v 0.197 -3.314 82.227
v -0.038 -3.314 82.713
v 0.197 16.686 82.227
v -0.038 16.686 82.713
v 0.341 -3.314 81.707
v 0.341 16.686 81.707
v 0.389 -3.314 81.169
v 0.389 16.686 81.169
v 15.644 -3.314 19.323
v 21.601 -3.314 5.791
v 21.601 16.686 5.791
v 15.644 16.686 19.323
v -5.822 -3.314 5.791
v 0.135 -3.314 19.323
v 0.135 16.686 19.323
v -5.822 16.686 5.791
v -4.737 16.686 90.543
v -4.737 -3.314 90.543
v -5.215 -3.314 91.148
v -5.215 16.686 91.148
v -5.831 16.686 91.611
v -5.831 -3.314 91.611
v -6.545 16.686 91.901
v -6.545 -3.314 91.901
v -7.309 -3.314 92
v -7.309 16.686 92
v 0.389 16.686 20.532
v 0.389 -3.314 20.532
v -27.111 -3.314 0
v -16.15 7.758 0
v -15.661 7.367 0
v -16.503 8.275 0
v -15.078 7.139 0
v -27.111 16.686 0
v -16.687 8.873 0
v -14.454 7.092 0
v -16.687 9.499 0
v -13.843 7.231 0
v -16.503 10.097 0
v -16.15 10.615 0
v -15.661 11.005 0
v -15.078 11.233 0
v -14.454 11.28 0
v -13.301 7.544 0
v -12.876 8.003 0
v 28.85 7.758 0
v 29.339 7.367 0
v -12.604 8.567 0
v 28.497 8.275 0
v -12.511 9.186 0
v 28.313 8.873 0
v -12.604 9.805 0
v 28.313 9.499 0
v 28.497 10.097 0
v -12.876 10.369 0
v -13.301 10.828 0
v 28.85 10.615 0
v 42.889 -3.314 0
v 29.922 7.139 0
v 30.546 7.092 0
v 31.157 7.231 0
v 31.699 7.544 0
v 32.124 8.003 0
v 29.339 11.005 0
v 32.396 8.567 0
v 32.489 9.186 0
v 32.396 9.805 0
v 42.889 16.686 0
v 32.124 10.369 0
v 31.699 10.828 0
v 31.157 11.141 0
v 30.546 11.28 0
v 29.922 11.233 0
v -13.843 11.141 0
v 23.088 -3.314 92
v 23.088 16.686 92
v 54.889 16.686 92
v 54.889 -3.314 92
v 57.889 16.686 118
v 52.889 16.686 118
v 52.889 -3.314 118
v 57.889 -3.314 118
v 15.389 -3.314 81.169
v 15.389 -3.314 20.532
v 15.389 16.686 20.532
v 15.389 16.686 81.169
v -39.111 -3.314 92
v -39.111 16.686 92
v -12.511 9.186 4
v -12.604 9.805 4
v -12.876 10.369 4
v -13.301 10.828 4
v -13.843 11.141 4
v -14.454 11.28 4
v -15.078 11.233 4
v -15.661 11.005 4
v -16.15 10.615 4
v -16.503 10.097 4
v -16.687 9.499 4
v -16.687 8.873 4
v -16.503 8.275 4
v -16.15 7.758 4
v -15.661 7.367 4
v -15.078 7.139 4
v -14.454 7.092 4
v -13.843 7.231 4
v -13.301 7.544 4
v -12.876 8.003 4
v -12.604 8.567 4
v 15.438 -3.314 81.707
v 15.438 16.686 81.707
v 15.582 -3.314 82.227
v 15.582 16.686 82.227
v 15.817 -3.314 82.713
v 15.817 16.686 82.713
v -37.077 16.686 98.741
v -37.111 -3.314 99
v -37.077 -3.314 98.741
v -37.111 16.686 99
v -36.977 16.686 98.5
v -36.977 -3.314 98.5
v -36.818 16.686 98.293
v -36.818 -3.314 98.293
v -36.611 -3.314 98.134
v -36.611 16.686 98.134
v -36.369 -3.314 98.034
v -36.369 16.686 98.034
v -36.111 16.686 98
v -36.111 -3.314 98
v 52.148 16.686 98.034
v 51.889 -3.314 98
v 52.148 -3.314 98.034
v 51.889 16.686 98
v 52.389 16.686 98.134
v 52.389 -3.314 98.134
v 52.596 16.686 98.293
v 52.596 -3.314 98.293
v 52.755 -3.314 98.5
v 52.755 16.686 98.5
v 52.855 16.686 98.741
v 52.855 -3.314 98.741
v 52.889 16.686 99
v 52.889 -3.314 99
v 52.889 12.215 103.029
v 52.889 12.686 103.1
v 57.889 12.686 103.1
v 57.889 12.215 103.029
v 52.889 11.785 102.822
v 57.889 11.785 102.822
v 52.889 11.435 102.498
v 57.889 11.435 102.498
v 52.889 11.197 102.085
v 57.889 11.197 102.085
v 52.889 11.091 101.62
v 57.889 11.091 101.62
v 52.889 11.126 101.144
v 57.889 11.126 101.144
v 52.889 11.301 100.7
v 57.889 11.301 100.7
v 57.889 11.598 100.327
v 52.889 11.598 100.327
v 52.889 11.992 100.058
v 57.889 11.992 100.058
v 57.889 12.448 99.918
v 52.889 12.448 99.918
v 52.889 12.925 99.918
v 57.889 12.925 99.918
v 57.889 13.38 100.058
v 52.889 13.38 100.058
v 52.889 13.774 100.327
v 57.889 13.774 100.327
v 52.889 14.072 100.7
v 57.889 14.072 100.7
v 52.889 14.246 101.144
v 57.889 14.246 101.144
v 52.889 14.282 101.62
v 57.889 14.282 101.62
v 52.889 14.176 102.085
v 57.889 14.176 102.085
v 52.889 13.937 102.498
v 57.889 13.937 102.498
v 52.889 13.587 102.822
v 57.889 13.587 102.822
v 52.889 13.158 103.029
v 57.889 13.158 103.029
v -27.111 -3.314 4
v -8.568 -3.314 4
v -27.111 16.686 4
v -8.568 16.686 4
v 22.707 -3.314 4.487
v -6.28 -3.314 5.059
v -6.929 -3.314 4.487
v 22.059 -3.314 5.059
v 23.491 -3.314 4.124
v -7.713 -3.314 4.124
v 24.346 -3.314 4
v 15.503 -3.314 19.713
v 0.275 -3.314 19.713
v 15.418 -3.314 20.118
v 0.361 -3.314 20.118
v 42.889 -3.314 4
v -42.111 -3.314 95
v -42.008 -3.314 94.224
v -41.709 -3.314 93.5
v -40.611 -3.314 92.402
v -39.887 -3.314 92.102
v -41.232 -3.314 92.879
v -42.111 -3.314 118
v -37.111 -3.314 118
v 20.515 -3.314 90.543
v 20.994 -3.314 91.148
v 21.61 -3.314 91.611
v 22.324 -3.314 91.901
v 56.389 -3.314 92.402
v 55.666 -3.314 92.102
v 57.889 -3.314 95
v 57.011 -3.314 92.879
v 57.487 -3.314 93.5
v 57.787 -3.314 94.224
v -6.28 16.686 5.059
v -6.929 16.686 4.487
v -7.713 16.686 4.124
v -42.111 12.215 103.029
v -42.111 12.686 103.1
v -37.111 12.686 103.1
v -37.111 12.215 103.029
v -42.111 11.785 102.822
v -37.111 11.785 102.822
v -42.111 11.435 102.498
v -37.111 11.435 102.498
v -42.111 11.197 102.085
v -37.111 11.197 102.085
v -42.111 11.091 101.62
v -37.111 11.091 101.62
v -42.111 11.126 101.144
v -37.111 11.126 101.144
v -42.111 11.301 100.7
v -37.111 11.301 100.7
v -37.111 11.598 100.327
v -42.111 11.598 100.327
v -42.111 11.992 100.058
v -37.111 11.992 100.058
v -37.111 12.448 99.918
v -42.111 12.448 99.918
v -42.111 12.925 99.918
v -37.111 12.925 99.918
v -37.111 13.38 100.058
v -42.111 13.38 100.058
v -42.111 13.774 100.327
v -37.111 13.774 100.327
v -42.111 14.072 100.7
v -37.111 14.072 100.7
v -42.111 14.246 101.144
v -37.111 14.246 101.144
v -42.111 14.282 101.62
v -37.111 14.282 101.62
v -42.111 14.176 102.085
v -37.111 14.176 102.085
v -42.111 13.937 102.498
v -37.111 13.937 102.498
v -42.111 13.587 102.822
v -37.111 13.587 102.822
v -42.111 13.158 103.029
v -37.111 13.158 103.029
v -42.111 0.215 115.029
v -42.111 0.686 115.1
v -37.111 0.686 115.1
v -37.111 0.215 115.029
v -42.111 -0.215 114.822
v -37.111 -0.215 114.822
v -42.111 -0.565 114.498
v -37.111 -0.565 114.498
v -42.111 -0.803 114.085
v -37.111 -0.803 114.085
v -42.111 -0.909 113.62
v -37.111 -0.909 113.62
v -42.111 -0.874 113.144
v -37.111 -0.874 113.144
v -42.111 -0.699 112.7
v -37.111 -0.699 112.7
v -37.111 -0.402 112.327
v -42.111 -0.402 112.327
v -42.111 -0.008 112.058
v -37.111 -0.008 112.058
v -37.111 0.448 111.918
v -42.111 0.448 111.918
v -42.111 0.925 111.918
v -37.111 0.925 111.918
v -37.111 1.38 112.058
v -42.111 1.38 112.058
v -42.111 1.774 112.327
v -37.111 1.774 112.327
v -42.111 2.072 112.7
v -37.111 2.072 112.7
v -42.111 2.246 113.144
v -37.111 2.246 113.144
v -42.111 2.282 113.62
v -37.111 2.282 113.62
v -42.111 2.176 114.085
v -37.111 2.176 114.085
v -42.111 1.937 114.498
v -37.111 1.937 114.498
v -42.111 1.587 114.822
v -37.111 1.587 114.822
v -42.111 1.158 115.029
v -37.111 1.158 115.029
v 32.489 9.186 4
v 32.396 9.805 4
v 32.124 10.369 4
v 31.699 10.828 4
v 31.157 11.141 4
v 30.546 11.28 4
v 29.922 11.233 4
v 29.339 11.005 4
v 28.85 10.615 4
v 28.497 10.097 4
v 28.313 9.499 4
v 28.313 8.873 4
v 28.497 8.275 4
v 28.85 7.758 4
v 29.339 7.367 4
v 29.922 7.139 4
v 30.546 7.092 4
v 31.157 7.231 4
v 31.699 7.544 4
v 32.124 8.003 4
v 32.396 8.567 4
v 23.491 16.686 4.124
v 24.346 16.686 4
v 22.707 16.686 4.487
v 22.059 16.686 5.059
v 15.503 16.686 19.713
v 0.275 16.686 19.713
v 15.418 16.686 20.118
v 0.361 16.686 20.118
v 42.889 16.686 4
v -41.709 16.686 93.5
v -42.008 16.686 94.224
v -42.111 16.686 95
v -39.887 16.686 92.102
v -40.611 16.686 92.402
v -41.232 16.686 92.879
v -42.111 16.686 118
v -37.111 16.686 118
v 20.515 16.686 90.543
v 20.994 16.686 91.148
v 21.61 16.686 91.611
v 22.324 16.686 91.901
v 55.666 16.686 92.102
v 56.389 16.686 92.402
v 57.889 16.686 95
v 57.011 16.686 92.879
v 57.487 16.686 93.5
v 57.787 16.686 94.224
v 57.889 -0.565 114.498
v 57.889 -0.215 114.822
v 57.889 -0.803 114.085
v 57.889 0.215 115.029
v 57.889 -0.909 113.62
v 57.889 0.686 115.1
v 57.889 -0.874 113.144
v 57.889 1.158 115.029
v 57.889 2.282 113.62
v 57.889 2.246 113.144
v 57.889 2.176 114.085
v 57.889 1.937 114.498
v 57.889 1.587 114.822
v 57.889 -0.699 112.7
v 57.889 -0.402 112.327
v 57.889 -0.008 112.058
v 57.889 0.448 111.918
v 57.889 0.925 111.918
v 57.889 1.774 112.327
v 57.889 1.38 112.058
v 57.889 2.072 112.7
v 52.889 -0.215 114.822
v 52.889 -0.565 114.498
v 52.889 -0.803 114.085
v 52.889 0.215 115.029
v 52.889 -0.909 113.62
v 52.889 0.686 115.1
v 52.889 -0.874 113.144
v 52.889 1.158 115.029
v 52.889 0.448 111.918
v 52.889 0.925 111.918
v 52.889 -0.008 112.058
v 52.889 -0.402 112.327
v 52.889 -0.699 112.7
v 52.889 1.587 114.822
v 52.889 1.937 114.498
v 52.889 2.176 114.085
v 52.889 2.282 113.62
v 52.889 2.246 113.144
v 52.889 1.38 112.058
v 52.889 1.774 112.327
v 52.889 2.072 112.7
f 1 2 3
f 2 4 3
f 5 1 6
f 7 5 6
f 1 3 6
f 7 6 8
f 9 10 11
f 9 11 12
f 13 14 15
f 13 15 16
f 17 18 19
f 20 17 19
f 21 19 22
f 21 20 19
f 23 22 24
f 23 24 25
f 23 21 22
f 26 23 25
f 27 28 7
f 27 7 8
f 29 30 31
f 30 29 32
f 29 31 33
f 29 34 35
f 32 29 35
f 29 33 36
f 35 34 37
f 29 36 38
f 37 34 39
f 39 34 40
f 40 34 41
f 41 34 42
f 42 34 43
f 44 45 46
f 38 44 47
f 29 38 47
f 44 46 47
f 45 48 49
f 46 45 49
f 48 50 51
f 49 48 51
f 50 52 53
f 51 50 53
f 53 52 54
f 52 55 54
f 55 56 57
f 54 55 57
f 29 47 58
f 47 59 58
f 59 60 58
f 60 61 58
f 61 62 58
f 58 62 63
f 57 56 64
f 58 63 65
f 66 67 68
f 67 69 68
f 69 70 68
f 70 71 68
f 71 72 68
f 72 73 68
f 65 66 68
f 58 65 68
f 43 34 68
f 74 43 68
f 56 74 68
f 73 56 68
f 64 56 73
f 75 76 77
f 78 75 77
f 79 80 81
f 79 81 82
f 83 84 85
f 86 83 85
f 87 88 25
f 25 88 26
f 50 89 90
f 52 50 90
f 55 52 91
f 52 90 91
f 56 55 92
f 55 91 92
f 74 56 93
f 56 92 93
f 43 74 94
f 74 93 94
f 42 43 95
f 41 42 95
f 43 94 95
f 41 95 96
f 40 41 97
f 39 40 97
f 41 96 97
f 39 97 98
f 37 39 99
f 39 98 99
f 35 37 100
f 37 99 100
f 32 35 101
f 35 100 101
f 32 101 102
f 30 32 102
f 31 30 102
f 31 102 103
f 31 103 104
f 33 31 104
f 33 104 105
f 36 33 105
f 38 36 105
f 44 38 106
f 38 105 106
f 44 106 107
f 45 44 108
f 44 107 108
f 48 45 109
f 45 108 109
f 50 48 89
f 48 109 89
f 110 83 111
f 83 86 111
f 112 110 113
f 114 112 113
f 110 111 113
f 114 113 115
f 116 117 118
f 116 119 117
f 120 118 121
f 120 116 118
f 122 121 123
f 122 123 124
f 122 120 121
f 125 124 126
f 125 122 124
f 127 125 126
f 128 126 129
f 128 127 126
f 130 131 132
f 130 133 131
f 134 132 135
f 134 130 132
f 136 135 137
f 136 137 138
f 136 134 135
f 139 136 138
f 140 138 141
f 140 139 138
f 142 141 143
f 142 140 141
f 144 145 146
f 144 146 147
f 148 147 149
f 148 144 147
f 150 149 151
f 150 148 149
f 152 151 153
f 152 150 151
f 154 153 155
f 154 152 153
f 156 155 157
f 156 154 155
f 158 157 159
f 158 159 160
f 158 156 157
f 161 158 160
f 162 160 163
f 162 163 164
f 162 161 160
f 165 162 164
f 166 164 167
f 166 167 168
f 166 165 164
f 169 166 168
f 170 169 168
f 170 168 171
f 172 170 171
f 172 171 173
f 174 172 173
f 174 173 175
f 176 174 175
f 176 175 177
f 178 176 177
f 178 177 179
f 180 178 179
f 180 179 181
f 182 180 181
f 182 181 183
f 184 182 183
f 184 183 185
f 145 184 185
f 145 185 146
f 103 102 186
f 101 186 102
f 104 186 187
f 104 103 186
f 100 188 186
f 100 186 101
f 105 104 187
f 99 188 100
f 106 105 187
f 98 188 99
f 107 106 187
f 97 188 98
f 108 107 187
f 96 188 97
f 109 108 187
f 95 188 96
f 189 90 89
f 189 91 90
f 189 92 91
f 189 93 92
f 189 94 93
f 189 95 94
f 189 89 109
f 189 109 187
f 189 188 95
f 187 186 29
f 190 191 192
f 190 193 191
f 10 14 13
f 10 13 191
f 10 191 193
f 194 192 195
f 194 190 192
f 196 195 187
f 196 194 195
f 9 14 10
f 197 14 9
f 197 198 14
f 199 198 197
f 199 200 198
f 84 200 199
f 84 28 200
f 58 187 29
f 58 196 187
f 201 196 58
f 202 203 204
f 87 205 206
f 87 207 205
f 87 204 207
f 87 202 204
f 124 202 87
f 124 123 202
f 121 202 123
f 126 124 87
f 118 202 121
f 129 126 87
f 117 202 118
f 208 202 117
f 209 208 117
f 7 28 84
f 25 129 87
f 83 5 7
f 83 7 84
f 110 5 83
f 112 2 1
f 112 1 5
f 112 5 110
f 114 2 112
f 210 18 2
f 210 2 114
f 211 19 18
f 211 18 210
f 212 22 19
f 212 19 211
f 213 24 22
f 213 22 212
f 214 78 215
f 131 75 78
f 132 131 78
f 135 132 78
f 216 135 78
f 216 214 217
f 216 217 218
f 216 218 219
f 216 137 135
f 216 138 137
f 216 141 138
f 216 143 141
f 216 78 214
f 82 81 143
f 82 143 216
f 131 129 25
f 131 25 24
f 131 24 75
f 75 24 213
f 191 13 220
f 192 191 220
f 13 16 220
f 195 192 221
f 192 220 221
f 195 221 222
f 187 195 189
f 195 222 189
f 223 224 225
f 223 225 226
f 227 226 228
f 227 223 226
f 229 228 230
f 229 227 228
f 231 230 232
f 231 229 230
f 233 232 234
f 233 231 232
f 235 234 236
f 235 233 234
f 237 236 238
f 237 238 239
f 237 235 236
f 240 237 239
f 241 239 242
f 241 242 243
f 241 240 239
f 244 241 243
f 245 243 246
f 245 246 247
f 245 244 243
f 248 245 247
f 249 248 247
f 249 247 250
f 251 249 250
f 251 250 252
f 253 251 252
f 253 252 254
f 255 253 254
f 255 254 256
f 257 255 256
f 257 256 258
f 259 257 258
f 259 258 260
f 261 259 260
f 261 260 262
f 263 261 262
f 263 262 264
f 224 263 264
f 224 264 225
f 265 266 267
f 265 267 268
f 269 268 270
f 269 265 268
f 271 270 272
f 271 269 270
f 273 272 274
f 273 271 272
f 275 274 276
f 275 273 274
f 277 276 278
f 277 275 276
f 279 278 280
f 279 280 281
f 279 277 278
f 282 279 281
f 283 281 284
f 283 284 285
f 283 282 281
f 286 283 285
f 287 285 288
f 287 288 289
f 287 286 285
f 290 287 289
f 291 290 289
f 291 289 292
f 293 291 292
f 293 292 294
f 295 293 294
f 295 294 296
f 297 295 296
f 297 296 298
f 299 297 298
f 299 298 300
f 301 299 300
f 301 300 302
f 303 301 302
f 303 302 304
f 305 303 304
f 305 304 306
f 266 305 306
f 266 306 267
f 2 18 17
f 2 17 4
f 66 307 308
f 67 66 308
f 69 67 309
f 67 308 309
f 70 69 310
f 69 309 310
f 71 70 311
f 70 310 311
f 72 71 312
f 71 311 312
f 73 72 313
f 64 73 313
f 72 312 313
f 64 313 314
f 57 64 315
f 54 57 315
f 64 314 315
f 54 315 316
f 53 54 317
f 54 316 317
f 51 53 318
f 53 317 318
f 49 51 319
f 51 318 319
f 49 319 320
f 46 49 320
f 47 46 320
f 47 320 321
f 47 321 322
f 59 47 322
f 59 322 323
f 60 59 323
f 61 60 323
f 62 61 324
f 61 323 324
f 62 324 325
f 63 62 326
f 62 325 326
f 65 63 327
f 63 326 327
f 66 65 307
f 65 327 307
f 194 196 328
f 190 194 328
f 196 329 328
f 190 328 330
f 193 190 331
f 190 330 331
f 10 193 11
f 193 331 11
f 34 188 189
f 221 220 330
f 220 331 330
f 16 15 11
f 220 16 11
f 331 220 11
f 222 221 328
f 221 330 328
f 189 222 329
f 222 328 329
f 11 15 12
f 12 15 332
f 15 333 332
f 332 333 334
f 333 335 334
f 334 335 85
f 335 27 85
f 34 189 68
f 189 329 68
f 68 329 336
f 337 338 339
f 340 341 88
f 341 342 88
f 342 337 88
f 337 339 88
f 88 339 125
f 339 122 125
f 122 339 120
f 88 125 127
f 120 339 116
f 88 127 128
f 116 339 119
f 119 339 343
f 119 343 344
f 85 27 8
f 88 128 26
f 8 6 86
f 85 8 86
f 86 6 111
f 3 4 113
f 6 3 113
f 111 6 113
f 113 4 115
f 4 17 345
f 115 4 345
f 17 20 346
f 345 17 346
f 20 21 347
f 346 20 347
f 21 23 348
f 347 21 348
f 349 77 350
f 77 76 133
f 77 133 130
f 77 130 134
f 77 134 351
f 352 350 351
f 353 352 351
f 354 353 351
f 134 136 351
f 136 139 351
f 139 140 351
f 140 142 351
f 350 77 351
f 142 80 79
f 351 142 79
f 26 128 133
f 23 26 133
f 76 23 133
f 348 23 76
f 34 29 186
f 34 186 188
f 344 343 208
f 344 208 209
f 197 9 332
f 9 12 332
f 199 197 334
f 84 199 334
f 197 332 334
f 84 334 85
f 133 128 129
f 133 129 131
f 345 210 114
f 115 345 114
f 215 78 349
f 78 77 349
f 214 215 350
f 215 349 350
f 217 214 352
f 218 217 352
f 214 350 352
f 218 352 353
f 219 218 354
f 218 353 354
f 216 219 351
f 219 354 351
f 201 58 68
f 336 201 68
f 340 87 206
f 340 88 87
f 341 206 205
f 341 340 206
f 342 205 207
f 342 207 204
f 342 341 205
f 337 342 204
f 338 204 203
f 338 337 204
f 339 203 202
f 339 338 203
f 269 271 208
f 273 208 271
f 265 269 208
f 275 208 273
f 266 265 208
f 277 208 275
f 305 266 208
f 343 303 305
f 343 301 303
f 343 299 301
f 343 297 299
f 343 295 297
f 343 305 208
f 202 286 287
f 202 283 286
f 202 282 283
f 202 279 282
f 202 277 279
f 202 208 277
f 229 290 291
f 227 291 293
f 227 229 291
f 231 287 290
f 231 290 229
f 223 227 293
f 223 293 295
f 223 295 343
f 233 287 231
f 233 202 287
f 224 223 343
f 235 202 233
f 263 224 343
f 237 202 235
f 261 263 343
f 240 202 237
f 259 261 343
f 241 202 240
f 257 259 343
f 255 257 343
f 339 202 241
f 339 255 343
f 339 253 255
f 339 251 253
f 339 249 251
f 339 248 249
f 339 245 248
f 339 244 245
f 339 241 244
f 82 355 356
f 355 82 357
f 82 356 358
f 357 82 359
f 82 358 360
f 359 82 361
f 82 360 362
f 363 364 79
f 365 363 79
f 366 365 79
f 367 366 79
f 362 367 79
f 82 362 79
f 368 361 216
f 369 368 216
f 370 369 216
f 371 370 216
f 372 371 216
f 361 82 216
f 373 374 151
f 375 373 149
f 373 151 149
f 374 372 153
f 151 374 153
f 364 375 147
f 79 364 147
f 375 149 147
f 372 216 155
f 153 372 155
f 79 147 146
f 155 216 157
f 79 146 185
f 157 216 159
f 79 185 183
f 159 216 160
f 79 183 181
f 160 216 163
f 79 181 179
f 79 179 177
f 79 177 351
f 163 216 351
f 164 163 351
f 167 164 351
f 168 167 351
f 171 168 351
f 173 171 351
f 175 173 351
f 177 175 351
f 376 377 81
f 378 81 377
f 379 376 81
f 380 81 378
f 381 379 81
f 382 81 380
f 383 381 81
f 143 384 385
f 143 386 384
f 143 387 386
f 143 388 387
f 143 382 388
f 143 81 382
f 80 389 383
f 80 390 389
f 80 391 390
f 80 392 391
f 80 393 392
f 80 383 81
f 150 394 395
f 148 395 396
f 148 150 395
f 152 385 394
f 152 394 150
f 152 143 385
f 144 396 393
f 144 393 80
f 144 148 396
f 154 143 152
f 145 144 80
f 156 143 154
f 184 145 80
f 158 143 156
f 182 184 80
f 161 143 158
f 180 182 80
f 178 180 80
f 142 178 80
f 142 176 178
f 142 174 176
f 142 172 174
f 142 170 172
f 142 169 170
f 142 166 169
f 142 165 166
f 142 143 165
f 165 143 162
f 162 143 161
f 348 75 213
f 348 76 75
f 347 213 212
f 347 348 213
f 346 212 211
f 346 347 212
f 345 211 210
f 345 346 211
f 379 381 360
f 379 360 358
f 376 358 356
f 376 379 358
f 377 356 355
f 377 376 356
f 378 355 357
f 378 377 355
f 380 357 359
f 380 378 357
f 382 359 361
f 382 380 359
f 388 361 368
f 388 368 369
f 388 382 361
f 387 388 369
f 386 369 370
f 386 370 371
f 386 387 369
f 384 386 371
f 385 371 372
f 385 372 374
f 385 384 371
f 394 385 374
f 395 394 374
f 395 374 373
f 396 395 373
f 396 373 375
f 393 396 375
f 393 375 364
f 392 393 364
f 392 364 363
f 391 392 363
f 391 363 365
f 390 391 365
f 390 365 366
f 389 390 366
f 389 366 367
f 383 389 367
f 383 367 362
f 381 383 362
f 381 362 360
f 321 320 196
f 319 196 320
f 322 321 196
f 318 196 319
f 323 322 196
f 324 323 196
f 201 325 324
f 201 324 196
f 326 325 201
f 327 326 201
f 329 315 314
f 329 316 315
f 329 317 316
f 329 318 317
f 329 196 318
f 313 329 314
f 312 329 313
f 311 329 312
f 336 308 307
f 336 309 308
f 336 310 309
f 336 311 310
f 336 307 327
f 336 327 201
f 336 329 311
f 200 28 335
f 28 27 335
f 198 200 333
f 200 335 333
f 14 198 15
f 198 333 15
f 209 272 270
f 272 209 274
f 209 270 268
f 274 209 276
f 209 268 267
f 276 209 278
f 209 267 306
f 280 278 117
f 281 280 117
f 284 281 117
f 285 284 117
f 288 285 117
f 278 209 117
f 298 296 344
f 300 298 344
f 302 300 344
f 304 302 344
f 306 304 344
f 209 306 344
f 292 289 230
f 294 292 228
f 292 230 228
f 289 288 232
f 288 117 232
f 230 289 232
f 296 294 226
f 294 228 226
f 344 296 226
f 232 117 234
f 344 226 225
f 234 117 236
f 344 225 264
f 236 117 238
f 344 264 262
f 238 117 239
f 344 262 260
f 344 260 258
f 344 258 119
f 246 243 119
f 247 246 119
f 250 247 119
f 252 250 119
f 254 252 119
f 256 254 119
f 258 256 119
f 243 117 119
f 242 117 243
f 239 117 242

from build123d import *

# Parameters (mm, degrees)
SKETCH_1_W          = 70
SKETCH_1_H          = 20
EXTRUDE_1_DEPTH     = 4
SKETCH_2_R          = 2.1
CUT_EXTRUDE_1_DEPTH = 4
SKETCH_3_W          = 15
SKETCH_3_H          = 20
EXTRUDE_2_DEPTH     = 88
SKETCH_4_W          = 100
SKETCH_4_H          = 20
EXTRUDE_3_DEPTH     = 6
SKETCH_5_W          = 5
SKETCH_5_H          = 20
EXTRUDE_4_DEPTH     = 20
SKETCH_6_R          = 1.6
CUT_EXTRUDE_2_DEPTH = 95
CUT_EXTRUDE_START   = -20
SKETCH_6_2_R        = 1.6
CUT_EXTRUDE_3_DEPTH = 20
EXTRUDE_5_DEPTH     = 20
EXTRUDE_6_DEPTH     = 20
FILLET_1_R          = 3
FILLET_2_R          = 1


with BuildPart() as part:
    # 草图1 → 凸台-拉伸1 (new body)
    with BuildSketch(Plane.XY):
        with Locations((7.889344262, 6.686147681)):
            Rectangle(SKETCH_1_W, SKETCH_1_H)
    extrude(amount=EXTRUDE_1_DEPTH)

    # 草图2 → 切除-拉伸1 (cut)
    with BuildSketch(Plane.XY.offset(4)):
        with Locations((-14.610655738, 9.186147681)):
            Circle(SKETCH_2_R)
        with Locations((30.389344262, 9.186147681)):
            Circle(SKETCH_2_R)
    extrude(amount=-CUT_EXTRUDE_1_DEPTH, mode=Mode.SUBTRACT)

    # 草图3 → 凸台-拉伸2 (add)
    with BuildSketch(Plane.XY.offset(4)):
        with Locations((7.889344262, 6.686147681)):
            Rectangle(SKETCH_3_W, SKETCH_3_H)
    extrude(amount=EXTRUDE_2_DEPTH)

    # 草图4 → 凸台-拉伸3 (add)
    with BuildSketch(Plane.XY.offset(92)):
        with Locations((7.889344262, 6.686147681)):
            Rectangle(SKETCH_4_W, SKETCH_4_H)
    extrude(amount=EXTRUDE_3_DEPTH)

    # 草图5 → 凸台-拉伸4 (add)
    with BuildSketch(Plane.XY.offset(98)):
        with Locations((-39.610655738, 6.686147681)):
            Rectangle(SKETCH_5_W, SKETCH_5_H)
        with Locations((55.389344262, 6.686147681)):
            Rectangle(SKETCH_5_W, SKETCH_5_H)
    extrude(amount=EXTRUDE_4_DEPTH)

    # 草图6 → 切除-拉伸2 (cut)
    with BuildSketch(Plane(origin=(-37.110655738, 0, 0), x_dir=(0, 0, -1), z_dir=(1, 0, 0))):
        with Locations(Location((-101.5, 12.686147681, 0), (0, 0, 180))):
            Circle(SKETCH_6_R)
        with Locations(Location((-113.5, 0.686147681, 0), (0, 0, 180))):
            Circle(SKETCH_6_R)
    extrude(amount=CUT_EXTRUDE_2_DEPTH, mode=Mode.SUBTRACT)

    # 草图6<2> → 切除-拉伸3 (cut)
    with BuildSketch(Plane(origin=(-37.110655738, 0, 0), x_dir=(0, 0, -1), z_dir=(1, 0, 0)).offset(CUT_EXTRUDE_START)):
        with Locations(Location((-101.5, 12.686147681, 0), (0, 0, 180))):
            Circle(SKETCH_6_2_R)
        with Locations(Location((-113.5, 0.686147681, 0), (0, 0, 180))):
            Circle(SKETCH_6_2_R)
    extrude(amount=CUT_EXTRUDE_3_DEPTH, mode=Mode.SUBTRACT)

    # 草图7 → 凸台-拉伸5 (add)
    with BuildSketch(Plane.XZ.offset(3.313852319)):
        Polygon((0.389344262, 4), (0.389344262, 19.90041694), (-6.610655738, 4), align=None)
        Polygon((15.389344262, 4), (22.389344262, 4), (15.389344262, 19.90041694), align=None)
    extrude(amount=-EXTRUDE_5_DEPTH)

    # 草图8 → 凸台-拉伸6 (add)
    with BuildSketch(Plane.XZ.offset(3.313852319)):
        Polygon((-5.610655738, 92), (0.389344262, 82), (0.389344262, 92), align=None)
        Polygon((15.389344262, 82), (15.389344262, 92), (21.389344262, 92), align=None)
    extrude(amount=-EXTRUDE_6_DEPTH)

    # 圆角1
    fillet_1_edges = [part.edges().sort_by_distance(p)[0] for p in [
        (-6.610655738, 6.686147681, 4),
        (0.389344262, 6.686147681, 19.90041694),
        (15.389344262, 6.686147681, 19.90041694),
        (22.389344262, 6.686147681, 4),
        (-5.610655738, 6.686147681, 92),
        (0.389344262, 6.686147681, 82),
        (21.389344262, 6.686147681, 92),
        (15.389344262, 6.686147681, 82),
        (-42.110655738, 6.686147681, 92),
        (57.889344262, 6.686147681, 92),
    ]]
    fillet(fillet_1_edges, radius=FILLET_1_R)

    # 圆角2
    fillet_2_edges = [part.edges().sort_by_distance(p)[0] for p in [
        (-37.110655738, 6.686147681, 98),
        (52.889344262, 6.686147681, 98),
    ]]
    fillet(fillet_2_edges, radius=FILLET_2_R)


solid = part.part
